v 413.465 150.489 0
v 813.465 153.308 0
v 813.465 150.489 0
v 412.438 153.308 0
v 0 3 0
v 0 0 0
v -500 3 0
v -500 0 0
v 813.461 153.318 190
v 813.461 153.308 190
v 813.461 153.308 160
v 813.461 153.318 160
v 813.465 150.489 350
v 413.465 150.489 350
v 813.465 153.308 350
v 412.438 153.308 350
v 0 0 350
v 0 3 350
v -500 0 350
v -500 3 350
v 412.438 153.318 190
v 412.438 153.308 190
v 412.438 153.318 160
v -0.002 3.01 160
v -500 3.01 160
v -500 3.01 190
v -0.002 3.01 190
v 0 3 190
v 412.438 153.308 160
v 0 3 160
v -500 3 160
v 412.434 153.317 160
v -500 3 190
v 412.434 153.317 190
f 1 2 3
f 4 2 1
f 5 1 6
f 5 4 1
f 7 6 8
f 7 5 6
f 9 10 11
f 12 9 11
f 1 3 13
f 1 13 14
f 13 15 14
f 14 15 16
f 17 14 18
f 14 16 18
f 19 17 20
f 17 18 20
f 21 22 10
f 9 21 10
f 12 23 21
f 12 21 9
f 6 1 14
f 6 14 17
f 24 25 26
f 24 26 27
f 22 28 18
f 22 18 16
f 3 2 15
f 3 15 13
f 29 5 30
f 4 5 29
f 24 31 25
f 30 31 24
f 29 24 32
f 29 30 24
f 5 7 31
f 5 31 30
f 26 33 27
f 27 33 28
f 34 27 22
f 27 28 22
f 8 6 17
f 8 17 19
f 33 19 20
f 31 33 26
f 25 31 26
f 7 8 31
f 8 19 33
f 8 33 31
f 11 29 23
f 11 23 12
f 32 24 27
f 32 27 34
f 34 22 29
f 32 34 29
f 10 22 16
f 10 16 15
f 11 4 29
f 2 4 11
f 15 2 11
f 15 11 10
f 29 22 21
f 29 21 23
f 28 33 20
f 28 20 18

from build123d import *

# Parameters (mm, degrees)
BOSS_EXTRUDE3_DEPTH = 350
SKETCH5_W           = 500
SKETCH5_H           = 30
BOSS_EXTRUDE4_DEPTH = 0.01
SKETCH6_W           = 438.972740408
SKETCH6_H           = 30
BOSS_EXTRUDE5_DEPTH = 0.01
SKETCH7_W           = 401.023798147
SKETCH7_H           = 30
BOSS_EXTRUDE6_DEPTH = 0.01


with BuildPart() as part:
    # Sketch2 → Boss-Extrude3 (new body)
    with BuildSketch(Plane.XY):
        Polygon((0, 0), (-500, 0), (-500, 3), (0, 3), (412.437530925, 153.307517797), (813.464753146, 153.307517797), (813.464753146, 150.488863063), (413.464753146, 150.488863063), align=None)
    extrude(amount=BOSS_EXTRUDE3_DEPTH)

    # Sketch5 → Boss-Extrude4 (add)
    with BuildSketch(Plane(origin=(0, 3, 0), x_dir=(1, 0, 0), z_dir=(0, 1, 0))):
        with Locations((-250, -175)):
            Rectangle(SKETCH5_W, SKETCH5_H)
    extrude(amount=BOSS_EXTRUDE4_DEPTH)

    # Sketch6 → Boss-Extrude5 (add)
    with BuildSketch(Plane(origin=(-0.965128259, 2.648271503, 0), x_dir=(0.9395515779432226, 0.34240740702327194, 0), z_dir=(-0.34240740702327194, 0.9395515779432226, 0))):
        with Locations((220.513592425, -175)):
            Rectangle(SKETCH6_W, SKETCH6_H)
    extrude(amount=BOSS_EXTRUDE5_DEPTH)

    # Sketch7 → Boss-Extrude6 (add)
    with BuildSketch(Plane(origin=(0, 153.307517797, 0), x_dir=(1, 0, 0), z_dir=(0, 1, 0))):
        with Locations((612.949429999, -175)):
            Rectangle(SKETCH7_W, SKETCH7_H)
    extrude(amount=BOSS_EXTRUDE6_DEPTH)


solid = part.part
